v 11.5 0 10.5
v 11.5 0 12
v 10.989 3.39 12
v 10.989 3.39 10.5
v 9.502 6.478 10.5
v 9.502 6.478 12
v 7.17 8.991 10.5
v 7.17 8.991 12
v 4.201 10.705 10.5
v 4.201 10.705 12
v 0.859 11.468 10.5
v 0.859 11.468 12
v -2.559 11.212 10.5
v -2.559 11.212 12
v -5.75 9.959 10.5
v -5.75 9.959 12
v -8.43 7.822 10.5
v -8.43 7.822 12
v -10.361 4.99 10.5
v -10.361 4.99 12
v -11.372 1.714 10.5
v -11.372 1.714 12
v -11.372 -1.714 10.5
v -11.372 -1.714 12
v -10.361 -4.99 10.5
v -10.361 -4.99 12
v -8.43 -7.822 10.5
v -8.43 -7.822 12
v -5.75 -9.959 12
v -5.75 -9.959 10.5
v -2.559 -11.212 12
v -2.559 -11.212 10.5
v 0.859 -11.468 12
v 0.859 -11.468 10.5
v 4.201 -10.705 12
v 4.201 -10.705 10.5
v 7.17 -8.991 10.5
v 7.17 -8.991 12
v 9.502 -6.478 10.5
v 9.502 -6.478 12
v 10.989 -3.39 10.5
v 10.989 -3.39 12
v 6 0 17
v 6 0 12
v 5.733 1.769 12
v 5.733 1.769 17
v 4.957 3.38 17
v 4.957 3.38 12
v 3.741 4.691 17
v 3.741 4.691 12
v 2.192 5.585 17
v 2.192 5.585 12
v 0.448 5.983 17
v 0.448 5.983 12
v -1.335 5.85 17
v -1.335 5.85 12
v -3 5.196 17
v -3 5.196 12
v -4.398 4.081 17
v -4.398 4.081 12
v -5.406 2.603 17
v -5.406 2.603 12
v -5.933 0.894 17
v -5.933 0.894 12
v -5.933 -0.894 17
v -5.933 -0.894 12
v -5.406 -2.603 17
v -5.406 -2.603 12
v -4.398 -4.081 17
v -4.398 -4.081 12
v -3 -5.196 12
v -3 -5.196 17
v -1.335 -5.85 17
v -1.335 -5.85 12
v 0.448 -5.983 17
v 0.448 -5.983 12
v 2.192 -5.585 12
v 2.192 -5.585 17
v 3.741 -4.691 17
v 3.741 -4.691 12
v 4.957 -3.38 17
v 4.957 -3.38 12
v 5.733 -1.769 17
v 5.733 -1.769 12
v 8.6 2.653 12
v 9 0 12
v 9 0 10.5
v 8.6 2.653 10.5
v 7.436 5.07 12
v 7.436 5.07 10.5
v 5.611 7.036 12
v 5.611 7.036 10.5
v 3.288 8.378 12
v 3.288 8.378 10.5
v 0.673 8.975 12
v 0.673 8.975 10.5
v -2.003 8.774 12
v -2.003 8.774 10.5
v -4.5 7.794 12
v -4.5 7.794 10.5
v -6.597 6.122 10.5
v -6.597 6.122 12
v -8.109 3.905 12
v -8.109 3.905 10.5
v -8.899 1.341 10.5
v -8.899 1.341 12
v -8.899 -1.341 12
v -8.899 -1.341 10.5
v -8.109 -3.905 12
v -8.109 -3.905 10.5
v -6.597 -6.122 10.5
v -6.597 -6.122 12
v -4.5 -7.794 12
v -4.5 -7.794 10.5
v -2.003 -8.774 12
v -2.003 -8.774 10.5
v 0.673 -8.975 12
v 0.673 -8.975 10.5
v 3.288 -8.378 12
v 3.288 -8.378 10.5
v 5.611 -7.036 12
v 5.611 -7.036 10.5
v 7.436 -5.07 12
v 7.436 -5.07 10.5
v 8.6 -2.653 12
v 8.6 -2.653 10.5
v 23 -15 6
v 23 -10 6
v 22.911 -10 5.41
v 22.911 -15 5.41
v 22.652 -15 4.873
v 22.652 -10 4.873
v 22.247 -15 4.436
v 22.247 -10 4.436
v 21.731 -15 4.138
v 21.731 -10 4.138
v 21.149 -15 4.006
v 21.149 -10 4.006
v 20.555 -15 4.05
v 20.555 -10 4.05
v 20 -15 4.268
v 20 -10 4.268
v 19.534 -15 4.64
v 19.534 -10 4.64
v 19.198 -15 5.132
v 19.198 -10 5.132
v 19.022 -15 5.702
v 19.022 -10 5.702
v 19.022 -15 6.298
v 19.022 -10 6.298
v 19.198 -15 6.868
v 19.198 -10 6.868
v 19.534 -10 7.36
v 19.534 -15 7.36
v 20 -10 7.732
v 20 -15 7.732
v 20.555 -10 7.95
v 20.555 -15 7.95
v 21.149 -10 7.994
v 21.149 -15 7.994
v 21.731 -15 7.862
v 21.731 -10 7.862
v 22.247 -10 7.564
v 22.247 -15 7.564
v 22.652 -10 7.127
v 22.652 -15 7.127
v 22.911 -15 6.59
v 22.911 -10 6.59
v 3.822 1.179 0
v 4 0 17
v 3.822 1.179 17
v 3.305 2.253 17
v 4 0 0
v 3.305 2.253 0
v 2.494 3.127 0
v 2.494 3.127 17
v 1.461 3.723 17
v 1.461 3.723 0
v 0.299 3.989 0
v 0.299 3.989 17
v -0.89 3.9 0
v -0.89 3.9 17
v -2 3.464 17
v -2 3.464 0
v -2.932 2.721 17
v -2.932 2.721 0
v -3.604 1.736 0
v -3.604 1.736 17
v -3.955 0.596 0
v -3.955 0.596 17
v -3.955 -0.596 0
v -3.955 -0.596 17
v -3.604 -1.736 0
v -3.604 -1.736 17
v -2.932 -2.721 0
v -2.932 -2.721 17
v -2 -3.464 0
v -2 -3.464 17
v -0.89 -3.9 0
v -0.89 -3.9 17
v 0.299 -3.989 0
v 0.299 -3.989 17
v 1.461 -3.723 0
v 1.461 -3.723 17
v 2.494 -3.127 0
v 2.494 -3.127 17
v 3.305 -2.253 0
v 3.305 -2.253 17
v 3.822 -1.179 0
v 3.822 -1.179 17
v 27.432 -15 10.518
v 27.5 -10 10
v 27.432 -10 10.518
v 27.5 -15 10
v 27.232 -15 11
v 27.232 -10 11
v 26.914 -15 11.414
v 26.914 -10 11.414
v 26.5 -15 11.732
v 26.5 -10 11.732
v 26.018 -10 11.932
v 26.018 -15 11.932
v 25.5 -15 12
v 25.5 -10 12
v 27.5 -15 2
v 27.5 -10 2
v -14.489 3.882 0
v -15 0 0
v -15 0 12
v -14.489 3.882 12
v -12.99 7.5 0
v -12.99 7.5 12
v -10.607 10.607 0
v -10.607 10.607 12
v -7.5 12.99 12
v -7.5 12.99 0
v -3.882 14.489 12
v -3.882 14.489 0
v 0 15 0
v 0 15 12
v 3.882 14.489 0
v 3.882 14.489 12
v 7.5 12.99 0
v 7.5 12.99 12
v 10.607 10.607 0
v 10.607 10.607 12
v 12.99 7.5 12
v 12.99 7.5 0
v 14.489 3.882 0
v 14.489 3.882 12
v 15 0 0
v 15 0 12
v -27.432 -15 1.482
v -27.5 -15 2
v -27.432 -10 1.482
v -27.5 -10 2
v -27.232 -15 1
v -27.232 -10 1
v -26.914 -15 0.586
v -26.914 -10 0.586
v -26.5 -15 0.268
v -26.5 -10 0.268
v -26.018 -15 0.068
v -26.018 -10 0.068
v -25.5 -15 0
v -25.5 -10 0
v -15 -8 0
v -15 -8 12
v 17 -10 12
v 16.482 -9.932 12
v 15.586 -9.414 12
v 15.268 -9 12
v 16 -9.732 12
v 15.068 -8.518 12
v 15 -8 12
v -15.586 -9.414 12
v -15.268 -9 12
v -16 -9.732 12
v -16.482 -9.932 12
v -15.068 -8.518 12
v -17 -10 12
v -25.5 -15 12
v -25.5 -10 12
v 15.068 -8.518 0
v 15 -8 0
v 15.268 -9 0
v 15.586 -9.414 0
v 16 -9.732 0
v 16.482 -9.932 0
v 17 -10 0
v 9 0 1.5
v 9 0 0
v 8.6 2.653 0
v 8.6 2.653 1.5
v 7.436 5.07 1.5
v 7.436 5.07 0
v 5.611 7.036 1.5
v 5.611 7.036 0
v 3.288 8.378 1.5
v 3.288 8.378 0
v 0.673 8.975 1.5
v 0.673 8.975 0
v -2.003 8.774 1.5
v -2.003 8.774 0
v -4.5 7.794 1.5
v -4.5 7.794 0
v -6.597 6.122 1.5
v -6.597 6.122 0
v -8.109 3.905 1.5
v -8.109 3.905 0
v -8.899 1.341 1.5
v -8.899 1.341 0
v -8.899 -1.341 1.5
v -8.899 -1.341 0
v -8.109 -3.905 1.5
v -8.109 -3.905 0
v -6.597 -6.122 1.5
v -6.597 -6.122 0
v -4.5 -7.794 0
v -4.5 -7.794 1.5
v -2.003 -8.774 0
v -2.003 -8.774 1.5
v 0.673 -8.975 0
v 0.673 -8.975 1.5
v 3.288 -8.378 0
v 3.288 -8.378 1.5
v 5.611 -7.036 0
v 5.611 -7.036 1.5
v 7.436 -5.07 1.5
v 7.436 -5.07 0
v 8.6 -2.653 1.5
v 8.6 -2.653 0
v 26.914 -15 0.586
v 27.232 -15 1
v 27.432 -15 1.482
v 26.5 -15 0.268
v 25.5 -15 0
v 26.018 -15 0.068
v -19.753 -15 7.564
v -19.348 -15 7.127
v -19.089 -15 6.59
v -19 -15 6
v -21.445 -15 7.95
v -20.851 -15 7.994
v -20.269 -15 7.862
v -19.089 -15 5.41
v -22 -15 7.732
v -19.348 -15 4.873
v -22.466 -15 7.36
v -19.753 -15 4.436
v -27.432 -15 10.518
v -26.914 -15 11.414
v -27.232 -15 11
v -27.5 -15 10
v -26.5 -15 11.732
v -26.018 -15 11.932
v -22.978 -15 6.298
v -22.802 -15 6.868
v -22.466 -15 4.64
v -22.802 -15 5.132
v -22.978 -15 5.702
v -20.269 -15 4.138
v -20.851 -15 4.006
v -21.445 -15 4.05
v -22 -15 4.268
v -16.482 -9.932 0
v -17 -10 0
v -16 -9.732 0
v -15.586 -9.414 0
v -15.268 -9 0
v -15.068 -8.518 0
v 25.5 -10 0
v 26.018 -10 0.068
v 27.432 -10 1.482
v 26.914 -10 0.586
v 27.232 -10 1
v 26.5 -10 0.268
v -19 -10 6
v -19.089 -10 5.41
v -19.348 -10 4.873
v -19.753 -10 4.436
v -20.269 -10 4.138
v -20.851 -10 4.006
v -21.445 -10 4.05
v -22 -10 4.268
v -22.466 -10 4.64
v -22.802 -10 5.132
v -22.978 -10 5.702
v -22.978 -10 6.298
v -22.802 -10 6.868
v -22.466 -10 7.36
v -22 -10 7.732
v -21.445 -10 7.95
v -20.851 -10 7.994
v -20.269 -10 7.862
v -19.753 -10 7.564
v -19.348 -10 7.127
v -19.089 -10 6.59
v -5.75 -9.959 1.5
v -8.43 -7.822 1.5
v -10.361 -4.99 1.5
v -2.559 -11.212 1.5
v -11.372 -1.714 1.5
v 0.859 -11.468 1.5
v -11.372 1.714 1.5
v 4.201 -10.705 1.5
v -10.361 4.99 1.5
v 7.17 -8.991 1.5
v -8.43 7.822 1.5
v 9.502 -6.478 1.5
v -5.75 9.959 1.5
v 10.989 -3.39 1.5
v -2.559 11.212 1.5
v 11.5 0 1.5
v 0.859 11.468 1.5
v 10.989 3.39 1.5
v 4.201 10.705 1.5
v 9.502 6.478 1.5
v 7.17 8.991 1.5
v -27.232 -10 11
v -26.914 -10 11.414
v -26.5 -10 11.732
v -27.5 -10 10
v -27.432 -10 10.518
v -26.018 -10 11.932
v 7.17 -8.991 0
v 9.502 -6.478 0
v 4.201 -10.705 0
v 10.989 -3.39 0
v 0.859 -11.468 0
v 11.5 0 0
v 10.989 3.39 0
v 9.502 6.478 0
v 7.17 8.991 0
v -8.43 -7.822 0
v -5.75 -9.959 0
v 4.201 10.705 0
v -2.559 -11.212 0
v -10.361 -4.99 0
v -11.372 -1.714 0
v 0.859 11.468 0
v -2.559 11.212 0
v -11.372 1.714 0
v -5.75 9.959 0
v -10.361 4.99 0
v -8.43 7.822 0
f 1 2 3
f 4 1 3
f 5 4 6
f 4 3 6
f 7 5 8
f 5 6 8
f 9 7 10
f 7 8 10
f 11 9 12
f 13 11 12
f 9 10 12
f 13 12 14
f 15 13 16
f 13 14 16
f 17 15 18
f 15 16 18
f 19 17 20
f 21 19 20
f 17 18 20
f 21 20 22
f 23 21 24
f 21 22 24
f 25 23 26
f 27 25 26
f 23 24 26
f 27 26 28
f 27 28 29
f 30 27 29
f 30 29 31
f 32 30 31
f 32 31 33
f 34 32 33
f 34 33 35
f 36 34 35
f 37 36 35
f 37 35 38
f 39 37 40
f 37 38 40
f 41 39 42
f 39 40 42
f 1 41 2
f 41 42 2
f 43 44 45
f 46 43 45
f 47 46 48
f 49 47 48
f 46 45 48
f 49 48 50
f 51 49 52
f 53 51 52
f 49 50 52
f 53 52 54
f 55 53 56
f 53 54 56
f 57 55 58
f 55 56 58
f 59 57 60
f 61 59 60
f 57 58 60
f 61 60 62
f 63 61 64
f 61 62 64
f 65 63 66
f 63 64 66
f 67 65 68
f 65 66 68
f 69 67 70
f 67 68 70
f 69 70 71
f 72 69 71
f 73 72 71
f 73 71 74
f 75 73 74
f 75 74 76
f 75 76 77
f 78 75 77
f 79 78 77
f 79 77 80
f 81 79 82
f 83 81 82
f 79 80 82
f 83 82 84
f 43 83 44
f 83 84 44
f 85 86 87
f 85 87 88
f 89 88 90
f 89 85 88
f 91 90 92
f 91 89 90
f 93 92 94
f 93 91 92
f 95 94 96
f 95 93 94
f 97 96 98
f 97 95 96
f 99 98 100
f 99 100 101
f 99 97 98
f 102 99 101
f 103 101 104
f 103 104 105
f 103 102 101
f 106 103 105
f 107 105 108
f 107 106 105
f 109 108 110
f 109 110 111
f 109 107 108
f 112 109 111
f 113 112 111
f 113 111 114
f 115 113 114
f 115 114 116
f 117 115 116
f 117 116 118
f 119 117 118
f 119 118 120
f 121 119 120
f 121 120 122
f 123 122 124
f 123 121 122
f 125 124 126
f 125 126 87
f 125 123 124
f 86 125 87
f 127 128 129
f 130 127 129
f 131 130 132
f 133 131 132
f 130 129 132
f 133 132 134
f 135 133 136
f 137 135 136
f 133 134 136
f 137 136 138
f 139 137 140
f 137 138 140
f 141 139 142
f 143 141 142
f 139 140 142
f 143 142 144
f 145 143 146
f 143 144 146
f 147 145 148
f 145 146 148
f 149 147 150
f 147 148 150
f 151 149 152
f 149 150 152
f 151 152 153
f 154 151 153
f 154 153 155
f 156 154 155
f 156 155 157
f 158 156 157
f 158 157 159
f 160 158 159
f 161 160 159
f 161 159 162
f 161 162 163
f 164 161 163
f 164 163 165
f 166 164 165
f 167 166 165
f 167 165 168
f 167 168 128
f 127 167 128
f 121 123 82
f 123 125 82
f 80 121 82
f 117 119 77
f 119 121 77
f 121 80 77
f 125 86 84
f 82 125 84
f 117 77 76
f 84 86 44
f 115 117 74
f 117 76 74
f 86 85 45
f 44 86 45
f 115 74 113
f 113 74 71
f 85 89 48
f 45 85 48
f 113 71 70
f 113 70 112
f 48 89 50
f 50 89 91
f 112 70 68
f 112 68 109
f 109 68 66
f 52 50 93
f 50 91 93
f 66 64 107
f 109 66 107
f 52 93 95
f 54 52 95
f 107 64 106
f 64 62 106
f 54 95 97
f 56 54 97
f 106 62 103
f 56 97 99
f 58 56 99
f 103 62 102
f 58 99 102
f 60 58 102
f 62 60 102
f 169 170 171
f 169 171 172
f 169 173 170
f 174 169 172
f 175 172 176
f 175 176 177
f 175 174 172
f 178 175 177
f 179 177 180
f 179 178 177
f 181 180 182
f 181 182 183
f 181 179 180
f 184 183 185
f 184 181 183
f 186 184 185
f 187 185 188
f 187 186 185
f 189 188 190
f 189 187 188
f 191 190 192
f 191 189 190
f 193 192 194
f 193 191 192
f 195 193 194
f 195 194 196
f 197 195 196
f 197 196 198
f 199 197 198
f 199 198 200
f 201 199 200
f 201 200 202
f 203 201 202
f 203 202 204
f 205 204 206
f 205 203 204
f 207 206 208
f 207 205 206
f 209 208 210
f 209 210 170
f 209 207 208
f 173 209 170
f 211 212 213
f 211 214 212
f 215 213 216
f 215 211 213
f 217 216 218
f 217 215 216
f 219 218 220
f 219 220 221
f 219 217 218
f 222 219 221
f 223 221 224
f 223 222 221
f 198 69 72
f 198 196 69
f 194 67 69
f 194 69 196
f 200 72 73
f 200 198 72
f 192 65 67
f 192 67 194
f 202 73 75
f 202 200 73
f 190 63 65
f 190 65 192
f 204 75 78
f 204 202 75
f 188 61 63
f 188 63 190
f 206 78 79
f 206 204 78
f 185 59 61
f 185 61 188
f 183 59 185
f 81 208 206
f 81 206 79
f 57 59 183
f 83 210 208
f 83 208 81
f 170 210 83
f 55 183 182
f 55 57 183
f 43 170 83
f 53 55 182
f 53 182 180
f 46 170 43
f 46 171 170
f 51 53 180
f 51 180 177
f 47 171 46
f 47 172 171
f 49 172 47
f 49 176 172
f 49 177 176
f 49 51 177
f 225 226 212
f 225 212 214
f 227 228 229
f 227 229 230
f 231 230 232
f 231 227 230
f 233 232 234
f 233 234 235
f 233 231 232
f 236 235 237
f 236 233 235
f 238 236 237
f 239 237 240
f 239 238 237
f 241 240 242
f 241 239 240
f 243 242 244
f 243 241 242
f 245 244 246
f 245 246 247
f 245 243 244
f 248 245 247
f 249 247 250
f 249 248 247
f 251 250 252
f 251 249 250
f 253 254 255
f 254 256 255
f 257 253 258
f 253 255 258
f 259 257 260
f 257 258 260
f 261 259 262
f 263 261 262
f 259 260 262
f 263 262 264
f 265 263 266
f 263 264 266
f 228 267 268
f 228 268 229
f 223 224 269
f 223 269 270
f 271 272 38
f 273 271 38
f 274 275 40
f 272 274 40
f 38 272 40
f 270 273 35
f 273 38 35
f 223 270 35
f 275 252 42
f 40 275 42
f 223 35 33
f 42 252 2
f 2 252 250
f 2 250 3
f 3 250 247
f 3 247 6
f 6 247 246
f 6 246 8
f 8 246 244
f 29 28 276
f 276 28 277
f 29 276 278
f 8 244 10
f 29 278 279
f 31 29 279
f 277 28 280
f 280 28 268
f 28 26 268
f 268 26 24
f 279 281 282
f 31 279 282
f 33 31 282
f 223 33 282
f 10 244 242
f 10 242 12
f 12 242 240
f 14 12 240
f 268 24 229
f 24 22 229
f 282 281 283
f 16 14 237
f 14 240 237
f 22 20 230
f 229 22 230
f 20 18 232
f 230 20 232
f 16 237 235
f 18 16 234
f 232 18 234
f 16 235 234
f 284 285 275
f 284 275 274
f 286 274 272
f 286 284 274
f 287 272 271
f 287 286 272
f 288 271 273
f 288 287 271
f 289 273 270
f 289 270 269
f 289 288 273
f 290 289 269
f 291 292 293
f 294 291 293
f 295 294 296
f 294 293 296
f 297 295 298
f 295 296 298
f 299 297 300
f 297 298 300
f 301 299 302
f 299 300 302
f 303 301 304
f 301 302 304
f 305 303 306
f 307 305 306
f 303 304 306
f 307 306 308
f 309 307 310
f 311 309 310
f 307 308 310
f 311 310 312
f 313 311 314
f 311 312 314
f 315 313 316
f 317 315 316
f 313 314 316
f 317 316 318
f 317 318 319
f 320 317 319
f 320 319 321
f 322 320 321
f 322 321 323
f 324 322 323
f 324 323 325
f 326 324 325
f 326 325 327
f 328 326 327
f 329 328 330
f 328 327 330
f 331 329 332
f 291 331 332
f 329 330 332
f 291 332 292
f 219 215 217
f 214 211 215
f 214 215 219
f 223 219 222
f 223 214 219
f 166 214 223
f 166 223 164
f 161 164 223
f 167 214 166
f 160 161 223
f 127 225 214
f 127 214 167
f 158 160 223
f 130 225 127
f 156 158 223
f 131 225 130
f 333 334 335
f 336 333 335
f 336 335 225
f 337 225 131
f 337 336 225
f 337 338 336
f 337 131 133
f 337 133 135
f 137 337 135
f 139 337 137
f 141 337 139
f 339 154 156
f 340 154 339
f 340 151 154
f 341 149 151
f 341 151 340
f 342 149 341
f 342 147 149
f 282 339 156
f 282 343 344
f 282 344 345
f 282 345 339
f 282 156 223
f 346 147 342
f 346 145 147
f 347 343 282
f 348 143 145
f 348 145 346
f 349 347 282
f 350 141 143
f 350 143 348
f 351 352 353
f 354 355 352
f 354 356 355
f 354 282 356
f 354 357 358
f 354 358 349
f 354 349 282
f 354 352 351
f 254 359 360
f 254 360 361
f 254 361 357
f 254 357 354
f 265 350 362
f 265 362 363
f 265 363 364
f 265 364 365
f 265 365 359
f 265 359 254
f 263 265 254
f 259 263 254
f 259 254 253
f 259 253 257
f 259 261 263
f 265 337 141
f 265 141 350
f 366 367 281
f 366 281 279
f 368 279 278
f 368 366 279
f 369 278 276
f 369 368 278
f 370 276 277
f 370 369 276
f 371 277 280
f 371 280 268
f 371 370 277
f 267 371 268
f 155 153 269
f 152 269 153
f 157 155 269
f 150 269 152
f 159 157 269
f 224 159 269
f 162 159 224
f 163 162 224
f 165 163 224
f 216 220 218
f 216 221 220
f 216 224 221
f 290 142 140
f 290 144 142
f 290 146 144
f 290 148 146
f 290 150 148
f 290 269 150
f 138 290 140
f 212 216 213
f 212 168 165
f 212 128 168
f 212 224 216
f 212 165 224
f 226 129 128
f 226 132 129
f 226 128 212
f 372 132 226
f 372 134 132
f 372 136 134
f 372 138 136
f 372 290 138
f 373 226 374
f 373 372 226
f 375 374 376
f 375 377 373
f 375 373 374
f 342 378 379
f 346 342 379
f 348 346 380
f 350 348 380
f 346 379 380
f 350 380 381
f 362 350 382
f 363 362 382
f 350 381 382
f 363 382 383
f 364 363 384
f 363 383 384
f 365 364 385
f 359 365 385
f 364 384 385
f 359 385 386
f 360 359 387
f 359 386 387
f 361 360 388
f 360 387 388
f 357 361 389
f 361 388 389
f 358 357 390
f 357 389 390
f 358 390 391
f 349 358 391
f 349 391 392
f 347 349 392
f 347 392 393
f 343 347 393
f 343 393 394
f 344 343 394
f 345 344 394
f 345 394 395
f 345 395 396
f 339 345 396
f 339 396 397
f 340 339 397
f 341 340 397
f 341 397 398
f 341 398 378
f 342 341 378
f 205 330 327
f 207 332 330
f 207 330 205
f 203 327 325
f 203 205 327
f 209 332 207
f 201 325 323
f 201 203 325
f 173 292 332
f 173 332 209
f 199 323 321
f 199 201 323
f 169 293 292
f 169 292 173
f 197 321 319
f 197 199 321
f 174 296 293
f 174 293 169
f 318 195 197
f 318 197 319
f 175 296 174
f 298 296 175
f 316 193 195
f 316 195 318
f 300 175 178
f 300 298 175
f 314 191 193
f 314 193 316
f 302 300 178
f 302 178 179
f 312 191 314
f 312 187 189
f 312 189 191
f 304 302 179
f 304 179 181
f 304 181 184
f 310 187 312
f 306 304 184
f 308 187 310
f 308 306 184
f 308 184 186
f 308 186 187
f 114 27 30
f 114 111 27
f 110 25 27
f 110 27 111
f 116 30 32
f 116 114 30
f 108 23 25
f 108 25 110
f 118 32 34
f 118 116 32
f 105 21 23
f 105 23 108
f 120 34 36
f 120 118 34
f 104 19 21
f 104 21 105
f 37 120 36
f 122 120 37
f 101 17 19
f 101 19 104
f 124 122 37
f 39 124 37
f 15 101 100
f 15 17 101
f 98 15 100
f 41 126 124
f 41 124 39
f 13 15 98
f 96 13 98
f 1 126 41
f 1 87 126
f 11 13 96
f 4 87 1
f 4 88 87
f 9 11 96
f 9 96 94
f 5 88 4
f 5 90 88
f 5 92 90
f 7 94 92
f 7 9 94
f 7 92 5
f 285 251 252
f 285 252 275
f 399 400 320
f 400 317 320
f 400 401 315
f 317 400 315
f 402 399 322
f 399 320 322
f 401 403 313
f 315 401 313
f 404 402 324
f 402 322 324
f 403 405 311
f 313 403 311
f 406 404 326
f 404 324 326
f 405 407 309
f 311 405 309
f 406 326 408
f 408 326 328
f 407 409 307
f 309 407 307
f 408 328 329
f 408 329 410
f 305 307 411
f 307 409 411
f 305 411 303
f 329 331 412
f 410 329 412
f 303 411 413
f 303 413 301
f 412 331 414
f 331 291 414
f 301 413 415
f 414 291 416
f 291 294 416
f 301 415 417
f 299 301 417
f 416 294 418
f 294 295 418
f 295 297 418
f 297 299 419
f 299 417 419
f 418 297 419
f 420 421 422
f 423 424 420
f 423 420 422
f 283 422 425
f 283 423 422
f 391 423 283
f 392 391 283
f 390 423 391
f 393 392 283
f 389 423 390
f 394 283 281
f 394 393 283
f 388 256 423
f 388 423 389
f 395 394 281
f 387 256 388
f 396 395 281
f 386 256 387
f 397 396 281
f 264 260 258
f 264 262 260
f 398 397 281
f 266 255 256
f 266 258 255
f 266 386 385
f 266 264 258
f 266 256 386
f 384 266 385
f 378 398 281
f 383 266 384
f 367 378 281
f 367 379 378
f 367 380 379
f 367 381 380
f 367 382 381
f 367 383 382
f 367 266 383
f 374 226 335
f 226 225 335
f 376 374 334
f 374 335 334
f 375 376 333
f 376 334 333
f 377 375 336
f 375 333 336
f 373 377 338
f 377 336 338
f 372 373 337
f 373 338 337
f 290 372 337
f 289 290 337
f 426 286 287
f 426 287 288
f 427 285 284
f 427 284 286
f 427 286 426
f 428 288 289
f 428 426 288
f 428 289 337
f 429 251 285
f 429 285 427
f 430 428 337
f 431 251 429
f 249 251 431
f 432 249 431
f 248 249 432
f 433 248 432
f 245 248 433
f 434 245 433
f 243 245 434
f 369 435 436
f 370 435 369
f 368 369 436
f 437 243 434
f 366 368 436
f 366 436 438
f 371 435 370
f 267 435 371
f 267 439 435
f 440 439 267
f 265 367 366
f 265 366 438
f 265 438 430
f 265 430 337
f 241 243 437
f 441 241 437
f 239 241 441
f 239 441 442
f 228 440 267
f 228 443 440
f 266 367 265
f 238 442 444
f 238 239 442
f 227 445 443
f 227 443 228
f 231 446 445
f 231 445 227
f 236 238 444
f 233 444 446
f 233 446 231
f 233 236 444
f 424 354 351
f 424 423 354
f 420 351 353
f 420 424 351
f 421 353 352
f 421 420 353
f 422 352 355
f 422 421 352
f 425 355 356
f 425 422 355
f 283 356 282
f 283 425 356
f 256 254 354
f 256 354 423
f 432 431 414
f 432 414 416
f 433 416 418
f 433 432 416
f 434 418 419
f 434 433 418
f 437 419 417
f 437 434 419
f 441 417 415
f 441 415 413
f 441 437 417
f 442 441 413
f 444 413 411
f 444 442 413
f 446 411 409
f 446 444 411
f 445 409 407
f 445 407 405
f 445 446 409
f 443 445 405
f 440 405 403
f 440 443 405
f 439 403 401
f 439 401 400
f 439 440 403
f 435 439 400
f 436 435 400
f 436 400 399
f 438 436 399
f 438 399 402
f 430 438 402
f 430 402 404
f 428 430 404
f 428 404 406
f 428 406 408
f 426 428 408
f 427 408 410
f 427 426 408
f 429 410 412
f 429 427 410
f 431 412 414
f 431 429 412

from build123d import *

# Parameters (mm, degrees)
SKETCH_2_R          = 4
EXTRUDE_1_DEPTH     = 12
FILLET_1_R          = 2
SKETCH_3_R          = 2
CUT_EXTRUDE_1_DEPTH = 6
SKETCH_4_R          = 6
SKETCH_4_R_2        = 4
EXTRUDE_2_DEPTH     = 5
SKETCH_5_R          = 11.5
SKETCH_5_R_2        = 9
CUT_EXTRUDE_2_DEPTH = 1.5


with BuildPart() as part:
    # 草图2 → 凸台-拉伸1 (new body)
    with BuildSketch(Plane.XY):
        with BuildLine():
            Line((0, -15), (-27.5, -15))
            Line((-27.5, -15), (-27.5, -10))
            Line((-27.5, -10), (-17, -10))
            ThreePointArc((-17, -10), (-15.585786438, -9.414213562), (-15, -8))
            Line((-15, -8), (-15, 0))
            ThreePointArc((-15, 0), (0, 15), (15, 0))
            Line((15, 0), (15, -8))
            ThreePointArc((15, -8), (15.585786438, -9.414213562), (17, -10))
            Line((17, -10), (27.5, -10))
            Line((27.5, -10), (27.5, -15))
            Line((27.5, -15), (0, -15))
        make_face()
        Circle(SKETCH_2_R, mode=Mode.SUBTRACT)
    extrude(amount=EXTRUDE_1_DEPTH)

    # 圆角1
    fillet_1_edges = [part.edges().sort_by_distance(p)[0] for p in [
        (27.5, -12.5, 0),
        (-27.5, -12.5, 0),
        (-27.5, -12.5, 12),
        (27.5, -12.5, 12),
    ]]
    fillet(fillet_1_edges, radius=FILLET_1_R)

    # 草图3 → 切除-拉伸1 (cut, through all)
    with BuildSketch(Plane(origin=(0, -10, 0), x_dir=(1, 0, 0), z_dir=(0, 1, 0))):
        with Locations((-21, -6)):
            Circle(SKETCH_3_R)
        with Locations((21, -6)):
            Circle(SKETCH_3_R)
    extrude(amount=-CUT_EXTRUDE_1_DEPTH, mode=Mode.SUBTRACT)

    # 草图4 → 凸台-拉伸2 (add)
    with BuildSketch(Plane.XY.offset(12)):
        Circle(SKETCH_4_R)
        Circle(SKETCH_4_R_2, mode=Mode.SUBTRACT)
    extrude(amount=EXTRUDE_2_DEPTH)

    # 草图5 → 切除-拉伸2 (cut)
    with BuildSketch(Plane.XY.offset(12)):
        Circle(SKETCH_5_R)
        Circle(SKETCH_5_R_2, mode=Mode.SUBTRACT)
    cut_extrude_2 = extrude(amount=-CUT_EXTRUDE_2_DEPTH, mode=Mode.SUBTRACT)

    # 镜向1: 切除-拉伸2 across plane
    add(cut_extrude_2.mirror(Plane.XY.offset(6)), mode=Mode.SUBTRACT)


solid = part.part
